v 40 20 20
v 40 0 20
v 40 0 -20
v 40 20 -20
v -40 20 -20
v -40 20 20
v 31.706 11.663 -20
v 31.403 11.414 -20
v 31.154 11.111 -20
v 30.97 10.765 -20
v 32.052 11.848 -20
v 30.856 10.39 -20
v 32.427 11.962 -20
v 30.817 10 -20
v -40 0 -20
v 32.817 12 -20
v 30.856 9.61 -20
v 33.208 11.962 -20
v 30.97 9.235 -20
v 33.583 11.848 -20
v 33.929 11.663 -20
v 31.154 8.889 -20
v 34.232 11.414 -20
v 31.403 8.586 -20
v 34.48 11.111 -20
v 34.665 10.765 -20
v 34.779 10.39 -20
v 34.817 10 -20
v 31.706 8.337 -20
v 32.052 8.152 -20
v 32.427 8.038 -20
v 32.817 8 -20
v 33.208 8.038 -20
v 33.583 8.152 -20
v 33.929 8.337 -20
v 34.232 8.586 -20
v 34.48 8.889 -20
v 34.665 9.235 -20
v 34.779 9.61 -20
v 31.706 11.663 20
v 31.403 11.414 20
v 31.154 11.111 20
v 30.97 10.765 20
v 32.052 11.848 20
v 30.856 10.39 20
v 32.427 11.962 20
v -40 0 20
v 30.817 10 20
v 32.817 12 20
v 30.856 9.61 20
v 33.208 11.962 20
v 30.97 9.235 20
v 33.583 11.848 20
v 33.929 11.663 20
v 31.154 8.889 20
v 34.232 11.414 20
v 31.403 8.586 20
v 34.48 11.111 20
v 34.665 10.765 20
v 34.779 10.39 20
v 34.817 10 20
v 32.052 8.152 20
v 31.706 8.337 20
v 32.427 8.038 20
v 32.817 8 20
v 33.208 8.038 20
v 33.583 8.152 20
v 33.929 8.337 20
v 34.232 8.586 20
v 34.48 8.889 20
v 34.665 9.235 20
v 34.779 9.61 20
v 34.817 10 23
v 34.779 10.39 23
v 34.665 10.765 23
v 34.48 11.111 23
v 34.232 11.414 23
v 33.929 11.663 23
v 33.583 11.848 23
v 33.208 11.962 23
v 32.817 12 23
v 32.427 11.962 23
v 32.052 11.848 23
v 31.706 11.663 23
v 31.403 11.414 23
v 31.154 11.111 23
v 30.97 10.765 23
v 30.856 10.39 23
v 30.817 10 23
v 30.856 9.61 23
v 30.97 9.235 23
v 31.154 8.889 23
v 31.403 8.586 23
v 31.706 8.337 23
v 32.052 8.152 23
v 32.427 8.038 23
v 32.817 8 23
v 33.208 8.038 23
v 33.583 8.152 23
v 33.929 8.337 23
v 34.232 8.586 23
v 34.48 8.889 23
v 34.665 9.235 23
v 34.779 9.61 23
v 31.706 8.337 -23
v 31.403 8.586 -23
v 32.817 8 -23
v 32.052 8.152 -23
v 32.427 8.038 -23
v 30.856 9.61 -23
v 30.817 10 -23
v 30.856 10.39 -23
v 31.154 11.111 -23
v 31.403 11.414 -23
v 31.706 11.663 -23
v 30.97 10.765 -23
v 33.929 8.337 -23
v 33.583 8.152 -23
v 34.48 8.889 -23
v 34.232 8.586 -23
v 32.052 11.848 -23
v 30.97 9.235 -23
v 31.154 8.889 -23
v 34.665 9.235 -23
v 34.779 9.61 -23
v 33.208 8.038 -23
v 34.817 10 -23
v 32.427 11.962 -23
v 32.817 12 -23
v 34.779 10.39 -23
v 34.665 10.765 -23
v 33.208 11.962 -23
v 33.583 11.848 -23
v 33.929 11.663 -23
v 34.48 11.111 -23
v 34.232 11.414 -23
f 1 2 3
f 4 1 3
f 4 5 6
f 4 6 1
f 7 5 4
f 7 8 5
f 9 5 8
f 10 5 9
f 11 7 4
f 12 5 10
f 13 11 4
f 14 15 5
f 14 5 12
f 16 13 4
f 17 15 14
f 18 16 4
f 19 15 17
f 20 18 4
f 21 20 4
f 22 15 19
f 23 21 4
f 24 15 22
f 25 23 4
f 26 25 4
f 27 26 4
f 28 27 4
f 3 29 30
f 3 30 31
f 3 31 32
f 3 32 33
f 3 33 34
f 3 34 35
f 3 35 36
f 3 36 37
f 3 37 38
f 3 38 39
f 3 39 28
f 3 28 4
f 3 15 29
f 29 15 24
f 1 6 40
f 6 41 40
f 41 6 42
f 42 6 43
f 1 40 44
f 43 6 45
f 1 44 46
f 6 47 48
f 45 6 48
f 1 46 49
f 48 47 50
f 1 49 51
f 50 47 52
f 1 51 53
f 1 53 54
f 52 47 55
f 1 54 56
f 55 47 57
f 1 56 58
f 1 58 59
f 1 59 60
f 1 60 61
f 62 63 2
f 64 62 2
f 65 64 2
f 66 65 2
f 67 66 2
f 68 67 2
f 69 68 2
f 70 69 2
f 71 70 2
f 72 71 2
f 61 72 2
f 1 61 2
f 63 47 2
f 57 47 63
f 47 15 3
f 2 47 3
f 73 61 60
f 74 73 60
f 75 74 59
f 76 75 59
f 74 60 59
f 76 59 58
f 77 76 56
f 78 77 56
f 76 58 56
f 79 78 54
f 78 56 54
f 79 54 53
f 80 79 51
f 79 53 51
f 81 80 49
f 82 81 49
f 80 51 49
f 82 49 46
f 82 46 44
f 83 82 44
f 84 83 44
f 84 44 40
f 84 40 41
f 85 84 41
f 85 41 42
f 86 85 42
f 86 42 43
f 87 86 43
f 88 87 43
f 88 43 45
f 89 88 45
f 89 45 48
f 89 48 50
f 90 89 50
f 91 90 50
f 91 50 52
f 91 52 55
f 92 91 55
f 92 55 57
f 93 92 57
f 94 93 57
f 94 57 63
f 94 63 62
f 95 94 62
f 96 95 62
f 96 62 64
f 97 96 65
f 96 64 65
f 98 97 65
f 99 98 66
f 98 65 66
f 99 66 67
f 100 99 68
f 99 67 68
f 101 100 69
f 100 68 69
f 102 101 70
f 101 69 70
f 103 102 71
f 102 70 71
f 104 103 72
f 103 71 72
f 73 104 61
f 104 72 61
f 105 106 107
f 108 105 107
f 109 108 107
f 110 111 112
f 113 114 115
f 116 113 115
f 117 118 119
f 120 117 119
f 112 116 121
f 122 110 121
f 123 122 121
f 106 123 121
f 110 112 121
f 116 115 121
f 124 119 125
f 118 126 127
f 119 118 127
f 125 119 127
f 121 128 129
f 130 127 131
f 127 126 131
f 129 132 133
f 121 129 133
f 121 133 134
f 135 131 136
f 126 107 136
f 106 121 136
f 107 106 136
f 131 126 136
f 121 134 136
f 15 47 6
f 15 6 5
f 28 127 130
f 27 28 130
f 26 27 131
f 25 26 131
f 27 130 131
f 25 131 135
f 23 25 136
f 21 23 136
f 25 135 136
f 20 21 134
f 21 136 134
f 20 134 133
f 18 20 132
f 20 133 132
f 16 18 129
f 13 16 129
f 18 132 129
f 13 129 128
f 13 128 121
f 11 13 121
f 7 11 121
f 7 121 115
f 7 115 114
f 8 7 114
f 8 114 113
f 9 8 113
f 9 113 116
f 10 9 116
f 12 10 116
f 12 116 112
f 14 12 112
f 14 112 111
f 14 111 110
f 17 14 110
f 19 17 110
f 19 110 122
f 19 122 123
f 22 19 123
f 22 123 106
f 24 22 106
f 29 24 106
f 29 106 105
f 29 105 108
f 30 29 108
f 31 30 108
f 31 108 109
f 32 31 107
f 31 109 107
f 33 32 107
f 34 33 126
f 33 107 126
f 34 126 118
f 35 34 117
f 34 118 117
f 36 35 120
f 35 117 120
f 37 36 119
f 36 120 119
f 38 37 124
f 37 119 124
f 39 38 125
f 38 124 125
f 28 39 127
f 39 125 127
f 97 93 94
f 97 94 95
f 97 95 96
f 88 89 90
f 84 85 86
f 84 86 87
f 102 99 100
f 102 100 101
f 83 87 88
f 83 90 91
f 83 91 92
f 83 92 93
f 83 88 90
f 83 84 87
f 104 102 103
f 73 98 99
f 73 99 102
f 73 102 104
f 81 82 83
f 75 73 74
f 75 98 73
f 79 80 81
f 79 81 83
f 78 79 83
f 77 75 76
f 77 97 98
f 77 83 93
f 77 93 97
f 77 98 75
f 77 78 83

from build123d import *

# Parameters (mm, degrees)
SKETCH3_W               = 80
SKETCH3_H               = 40
BOSS_EXTRUDE1_DEPTH     = 20
SKETCH5_R               = 2
CUT_EXTRUDE2_DEPTH      = 40
BOSS_EXTRUDE2_START     = -23
BOSS_EXTRUDE2_OUTLINE_R = 2
BOSS_EXTRUDE2_DEPTH     = 46


# Read off the part's stored shape, not the designer's step: Boss-Extrude2
with BuildPart() as part:
    # Sketch3 → Boss-Extrude1 (new body)
    with BuildSketch(Plane(origin=(0, 0, 0), x_dir=(1, 0, 0), z_dir=(0, 1, 0))):
        Rectangle(SKETCH3_W, SKETCH3_H)
    extrude(amount=BOSS_EXTRUDE1_DEPTH)

    # Sketch5 → Cut-Extrude2 (cut)
    with BuildSketch(Plane.XY.offset(20)):
        with Locations((32.81740635, 10)):
            Circle(SKETCH5_R)
    extrude(amount=-CUT_EXTRUDE2_DEPTH, mode=Mode.SUBTRACT)

    # Boss-Extrude2 outline → Boss-Extrude2 (add)
    with BuildSketch(Plane.XY.offset(BOSS_EXTRUDE2_START)):
        with Locations((32.81740635, 10)):
            Circle(BOSS_EXTRUDE2_OUTLINE_R)
    extrude(amount=BOSS_EXTRUDE2_DEPTH)


solid = part.part
